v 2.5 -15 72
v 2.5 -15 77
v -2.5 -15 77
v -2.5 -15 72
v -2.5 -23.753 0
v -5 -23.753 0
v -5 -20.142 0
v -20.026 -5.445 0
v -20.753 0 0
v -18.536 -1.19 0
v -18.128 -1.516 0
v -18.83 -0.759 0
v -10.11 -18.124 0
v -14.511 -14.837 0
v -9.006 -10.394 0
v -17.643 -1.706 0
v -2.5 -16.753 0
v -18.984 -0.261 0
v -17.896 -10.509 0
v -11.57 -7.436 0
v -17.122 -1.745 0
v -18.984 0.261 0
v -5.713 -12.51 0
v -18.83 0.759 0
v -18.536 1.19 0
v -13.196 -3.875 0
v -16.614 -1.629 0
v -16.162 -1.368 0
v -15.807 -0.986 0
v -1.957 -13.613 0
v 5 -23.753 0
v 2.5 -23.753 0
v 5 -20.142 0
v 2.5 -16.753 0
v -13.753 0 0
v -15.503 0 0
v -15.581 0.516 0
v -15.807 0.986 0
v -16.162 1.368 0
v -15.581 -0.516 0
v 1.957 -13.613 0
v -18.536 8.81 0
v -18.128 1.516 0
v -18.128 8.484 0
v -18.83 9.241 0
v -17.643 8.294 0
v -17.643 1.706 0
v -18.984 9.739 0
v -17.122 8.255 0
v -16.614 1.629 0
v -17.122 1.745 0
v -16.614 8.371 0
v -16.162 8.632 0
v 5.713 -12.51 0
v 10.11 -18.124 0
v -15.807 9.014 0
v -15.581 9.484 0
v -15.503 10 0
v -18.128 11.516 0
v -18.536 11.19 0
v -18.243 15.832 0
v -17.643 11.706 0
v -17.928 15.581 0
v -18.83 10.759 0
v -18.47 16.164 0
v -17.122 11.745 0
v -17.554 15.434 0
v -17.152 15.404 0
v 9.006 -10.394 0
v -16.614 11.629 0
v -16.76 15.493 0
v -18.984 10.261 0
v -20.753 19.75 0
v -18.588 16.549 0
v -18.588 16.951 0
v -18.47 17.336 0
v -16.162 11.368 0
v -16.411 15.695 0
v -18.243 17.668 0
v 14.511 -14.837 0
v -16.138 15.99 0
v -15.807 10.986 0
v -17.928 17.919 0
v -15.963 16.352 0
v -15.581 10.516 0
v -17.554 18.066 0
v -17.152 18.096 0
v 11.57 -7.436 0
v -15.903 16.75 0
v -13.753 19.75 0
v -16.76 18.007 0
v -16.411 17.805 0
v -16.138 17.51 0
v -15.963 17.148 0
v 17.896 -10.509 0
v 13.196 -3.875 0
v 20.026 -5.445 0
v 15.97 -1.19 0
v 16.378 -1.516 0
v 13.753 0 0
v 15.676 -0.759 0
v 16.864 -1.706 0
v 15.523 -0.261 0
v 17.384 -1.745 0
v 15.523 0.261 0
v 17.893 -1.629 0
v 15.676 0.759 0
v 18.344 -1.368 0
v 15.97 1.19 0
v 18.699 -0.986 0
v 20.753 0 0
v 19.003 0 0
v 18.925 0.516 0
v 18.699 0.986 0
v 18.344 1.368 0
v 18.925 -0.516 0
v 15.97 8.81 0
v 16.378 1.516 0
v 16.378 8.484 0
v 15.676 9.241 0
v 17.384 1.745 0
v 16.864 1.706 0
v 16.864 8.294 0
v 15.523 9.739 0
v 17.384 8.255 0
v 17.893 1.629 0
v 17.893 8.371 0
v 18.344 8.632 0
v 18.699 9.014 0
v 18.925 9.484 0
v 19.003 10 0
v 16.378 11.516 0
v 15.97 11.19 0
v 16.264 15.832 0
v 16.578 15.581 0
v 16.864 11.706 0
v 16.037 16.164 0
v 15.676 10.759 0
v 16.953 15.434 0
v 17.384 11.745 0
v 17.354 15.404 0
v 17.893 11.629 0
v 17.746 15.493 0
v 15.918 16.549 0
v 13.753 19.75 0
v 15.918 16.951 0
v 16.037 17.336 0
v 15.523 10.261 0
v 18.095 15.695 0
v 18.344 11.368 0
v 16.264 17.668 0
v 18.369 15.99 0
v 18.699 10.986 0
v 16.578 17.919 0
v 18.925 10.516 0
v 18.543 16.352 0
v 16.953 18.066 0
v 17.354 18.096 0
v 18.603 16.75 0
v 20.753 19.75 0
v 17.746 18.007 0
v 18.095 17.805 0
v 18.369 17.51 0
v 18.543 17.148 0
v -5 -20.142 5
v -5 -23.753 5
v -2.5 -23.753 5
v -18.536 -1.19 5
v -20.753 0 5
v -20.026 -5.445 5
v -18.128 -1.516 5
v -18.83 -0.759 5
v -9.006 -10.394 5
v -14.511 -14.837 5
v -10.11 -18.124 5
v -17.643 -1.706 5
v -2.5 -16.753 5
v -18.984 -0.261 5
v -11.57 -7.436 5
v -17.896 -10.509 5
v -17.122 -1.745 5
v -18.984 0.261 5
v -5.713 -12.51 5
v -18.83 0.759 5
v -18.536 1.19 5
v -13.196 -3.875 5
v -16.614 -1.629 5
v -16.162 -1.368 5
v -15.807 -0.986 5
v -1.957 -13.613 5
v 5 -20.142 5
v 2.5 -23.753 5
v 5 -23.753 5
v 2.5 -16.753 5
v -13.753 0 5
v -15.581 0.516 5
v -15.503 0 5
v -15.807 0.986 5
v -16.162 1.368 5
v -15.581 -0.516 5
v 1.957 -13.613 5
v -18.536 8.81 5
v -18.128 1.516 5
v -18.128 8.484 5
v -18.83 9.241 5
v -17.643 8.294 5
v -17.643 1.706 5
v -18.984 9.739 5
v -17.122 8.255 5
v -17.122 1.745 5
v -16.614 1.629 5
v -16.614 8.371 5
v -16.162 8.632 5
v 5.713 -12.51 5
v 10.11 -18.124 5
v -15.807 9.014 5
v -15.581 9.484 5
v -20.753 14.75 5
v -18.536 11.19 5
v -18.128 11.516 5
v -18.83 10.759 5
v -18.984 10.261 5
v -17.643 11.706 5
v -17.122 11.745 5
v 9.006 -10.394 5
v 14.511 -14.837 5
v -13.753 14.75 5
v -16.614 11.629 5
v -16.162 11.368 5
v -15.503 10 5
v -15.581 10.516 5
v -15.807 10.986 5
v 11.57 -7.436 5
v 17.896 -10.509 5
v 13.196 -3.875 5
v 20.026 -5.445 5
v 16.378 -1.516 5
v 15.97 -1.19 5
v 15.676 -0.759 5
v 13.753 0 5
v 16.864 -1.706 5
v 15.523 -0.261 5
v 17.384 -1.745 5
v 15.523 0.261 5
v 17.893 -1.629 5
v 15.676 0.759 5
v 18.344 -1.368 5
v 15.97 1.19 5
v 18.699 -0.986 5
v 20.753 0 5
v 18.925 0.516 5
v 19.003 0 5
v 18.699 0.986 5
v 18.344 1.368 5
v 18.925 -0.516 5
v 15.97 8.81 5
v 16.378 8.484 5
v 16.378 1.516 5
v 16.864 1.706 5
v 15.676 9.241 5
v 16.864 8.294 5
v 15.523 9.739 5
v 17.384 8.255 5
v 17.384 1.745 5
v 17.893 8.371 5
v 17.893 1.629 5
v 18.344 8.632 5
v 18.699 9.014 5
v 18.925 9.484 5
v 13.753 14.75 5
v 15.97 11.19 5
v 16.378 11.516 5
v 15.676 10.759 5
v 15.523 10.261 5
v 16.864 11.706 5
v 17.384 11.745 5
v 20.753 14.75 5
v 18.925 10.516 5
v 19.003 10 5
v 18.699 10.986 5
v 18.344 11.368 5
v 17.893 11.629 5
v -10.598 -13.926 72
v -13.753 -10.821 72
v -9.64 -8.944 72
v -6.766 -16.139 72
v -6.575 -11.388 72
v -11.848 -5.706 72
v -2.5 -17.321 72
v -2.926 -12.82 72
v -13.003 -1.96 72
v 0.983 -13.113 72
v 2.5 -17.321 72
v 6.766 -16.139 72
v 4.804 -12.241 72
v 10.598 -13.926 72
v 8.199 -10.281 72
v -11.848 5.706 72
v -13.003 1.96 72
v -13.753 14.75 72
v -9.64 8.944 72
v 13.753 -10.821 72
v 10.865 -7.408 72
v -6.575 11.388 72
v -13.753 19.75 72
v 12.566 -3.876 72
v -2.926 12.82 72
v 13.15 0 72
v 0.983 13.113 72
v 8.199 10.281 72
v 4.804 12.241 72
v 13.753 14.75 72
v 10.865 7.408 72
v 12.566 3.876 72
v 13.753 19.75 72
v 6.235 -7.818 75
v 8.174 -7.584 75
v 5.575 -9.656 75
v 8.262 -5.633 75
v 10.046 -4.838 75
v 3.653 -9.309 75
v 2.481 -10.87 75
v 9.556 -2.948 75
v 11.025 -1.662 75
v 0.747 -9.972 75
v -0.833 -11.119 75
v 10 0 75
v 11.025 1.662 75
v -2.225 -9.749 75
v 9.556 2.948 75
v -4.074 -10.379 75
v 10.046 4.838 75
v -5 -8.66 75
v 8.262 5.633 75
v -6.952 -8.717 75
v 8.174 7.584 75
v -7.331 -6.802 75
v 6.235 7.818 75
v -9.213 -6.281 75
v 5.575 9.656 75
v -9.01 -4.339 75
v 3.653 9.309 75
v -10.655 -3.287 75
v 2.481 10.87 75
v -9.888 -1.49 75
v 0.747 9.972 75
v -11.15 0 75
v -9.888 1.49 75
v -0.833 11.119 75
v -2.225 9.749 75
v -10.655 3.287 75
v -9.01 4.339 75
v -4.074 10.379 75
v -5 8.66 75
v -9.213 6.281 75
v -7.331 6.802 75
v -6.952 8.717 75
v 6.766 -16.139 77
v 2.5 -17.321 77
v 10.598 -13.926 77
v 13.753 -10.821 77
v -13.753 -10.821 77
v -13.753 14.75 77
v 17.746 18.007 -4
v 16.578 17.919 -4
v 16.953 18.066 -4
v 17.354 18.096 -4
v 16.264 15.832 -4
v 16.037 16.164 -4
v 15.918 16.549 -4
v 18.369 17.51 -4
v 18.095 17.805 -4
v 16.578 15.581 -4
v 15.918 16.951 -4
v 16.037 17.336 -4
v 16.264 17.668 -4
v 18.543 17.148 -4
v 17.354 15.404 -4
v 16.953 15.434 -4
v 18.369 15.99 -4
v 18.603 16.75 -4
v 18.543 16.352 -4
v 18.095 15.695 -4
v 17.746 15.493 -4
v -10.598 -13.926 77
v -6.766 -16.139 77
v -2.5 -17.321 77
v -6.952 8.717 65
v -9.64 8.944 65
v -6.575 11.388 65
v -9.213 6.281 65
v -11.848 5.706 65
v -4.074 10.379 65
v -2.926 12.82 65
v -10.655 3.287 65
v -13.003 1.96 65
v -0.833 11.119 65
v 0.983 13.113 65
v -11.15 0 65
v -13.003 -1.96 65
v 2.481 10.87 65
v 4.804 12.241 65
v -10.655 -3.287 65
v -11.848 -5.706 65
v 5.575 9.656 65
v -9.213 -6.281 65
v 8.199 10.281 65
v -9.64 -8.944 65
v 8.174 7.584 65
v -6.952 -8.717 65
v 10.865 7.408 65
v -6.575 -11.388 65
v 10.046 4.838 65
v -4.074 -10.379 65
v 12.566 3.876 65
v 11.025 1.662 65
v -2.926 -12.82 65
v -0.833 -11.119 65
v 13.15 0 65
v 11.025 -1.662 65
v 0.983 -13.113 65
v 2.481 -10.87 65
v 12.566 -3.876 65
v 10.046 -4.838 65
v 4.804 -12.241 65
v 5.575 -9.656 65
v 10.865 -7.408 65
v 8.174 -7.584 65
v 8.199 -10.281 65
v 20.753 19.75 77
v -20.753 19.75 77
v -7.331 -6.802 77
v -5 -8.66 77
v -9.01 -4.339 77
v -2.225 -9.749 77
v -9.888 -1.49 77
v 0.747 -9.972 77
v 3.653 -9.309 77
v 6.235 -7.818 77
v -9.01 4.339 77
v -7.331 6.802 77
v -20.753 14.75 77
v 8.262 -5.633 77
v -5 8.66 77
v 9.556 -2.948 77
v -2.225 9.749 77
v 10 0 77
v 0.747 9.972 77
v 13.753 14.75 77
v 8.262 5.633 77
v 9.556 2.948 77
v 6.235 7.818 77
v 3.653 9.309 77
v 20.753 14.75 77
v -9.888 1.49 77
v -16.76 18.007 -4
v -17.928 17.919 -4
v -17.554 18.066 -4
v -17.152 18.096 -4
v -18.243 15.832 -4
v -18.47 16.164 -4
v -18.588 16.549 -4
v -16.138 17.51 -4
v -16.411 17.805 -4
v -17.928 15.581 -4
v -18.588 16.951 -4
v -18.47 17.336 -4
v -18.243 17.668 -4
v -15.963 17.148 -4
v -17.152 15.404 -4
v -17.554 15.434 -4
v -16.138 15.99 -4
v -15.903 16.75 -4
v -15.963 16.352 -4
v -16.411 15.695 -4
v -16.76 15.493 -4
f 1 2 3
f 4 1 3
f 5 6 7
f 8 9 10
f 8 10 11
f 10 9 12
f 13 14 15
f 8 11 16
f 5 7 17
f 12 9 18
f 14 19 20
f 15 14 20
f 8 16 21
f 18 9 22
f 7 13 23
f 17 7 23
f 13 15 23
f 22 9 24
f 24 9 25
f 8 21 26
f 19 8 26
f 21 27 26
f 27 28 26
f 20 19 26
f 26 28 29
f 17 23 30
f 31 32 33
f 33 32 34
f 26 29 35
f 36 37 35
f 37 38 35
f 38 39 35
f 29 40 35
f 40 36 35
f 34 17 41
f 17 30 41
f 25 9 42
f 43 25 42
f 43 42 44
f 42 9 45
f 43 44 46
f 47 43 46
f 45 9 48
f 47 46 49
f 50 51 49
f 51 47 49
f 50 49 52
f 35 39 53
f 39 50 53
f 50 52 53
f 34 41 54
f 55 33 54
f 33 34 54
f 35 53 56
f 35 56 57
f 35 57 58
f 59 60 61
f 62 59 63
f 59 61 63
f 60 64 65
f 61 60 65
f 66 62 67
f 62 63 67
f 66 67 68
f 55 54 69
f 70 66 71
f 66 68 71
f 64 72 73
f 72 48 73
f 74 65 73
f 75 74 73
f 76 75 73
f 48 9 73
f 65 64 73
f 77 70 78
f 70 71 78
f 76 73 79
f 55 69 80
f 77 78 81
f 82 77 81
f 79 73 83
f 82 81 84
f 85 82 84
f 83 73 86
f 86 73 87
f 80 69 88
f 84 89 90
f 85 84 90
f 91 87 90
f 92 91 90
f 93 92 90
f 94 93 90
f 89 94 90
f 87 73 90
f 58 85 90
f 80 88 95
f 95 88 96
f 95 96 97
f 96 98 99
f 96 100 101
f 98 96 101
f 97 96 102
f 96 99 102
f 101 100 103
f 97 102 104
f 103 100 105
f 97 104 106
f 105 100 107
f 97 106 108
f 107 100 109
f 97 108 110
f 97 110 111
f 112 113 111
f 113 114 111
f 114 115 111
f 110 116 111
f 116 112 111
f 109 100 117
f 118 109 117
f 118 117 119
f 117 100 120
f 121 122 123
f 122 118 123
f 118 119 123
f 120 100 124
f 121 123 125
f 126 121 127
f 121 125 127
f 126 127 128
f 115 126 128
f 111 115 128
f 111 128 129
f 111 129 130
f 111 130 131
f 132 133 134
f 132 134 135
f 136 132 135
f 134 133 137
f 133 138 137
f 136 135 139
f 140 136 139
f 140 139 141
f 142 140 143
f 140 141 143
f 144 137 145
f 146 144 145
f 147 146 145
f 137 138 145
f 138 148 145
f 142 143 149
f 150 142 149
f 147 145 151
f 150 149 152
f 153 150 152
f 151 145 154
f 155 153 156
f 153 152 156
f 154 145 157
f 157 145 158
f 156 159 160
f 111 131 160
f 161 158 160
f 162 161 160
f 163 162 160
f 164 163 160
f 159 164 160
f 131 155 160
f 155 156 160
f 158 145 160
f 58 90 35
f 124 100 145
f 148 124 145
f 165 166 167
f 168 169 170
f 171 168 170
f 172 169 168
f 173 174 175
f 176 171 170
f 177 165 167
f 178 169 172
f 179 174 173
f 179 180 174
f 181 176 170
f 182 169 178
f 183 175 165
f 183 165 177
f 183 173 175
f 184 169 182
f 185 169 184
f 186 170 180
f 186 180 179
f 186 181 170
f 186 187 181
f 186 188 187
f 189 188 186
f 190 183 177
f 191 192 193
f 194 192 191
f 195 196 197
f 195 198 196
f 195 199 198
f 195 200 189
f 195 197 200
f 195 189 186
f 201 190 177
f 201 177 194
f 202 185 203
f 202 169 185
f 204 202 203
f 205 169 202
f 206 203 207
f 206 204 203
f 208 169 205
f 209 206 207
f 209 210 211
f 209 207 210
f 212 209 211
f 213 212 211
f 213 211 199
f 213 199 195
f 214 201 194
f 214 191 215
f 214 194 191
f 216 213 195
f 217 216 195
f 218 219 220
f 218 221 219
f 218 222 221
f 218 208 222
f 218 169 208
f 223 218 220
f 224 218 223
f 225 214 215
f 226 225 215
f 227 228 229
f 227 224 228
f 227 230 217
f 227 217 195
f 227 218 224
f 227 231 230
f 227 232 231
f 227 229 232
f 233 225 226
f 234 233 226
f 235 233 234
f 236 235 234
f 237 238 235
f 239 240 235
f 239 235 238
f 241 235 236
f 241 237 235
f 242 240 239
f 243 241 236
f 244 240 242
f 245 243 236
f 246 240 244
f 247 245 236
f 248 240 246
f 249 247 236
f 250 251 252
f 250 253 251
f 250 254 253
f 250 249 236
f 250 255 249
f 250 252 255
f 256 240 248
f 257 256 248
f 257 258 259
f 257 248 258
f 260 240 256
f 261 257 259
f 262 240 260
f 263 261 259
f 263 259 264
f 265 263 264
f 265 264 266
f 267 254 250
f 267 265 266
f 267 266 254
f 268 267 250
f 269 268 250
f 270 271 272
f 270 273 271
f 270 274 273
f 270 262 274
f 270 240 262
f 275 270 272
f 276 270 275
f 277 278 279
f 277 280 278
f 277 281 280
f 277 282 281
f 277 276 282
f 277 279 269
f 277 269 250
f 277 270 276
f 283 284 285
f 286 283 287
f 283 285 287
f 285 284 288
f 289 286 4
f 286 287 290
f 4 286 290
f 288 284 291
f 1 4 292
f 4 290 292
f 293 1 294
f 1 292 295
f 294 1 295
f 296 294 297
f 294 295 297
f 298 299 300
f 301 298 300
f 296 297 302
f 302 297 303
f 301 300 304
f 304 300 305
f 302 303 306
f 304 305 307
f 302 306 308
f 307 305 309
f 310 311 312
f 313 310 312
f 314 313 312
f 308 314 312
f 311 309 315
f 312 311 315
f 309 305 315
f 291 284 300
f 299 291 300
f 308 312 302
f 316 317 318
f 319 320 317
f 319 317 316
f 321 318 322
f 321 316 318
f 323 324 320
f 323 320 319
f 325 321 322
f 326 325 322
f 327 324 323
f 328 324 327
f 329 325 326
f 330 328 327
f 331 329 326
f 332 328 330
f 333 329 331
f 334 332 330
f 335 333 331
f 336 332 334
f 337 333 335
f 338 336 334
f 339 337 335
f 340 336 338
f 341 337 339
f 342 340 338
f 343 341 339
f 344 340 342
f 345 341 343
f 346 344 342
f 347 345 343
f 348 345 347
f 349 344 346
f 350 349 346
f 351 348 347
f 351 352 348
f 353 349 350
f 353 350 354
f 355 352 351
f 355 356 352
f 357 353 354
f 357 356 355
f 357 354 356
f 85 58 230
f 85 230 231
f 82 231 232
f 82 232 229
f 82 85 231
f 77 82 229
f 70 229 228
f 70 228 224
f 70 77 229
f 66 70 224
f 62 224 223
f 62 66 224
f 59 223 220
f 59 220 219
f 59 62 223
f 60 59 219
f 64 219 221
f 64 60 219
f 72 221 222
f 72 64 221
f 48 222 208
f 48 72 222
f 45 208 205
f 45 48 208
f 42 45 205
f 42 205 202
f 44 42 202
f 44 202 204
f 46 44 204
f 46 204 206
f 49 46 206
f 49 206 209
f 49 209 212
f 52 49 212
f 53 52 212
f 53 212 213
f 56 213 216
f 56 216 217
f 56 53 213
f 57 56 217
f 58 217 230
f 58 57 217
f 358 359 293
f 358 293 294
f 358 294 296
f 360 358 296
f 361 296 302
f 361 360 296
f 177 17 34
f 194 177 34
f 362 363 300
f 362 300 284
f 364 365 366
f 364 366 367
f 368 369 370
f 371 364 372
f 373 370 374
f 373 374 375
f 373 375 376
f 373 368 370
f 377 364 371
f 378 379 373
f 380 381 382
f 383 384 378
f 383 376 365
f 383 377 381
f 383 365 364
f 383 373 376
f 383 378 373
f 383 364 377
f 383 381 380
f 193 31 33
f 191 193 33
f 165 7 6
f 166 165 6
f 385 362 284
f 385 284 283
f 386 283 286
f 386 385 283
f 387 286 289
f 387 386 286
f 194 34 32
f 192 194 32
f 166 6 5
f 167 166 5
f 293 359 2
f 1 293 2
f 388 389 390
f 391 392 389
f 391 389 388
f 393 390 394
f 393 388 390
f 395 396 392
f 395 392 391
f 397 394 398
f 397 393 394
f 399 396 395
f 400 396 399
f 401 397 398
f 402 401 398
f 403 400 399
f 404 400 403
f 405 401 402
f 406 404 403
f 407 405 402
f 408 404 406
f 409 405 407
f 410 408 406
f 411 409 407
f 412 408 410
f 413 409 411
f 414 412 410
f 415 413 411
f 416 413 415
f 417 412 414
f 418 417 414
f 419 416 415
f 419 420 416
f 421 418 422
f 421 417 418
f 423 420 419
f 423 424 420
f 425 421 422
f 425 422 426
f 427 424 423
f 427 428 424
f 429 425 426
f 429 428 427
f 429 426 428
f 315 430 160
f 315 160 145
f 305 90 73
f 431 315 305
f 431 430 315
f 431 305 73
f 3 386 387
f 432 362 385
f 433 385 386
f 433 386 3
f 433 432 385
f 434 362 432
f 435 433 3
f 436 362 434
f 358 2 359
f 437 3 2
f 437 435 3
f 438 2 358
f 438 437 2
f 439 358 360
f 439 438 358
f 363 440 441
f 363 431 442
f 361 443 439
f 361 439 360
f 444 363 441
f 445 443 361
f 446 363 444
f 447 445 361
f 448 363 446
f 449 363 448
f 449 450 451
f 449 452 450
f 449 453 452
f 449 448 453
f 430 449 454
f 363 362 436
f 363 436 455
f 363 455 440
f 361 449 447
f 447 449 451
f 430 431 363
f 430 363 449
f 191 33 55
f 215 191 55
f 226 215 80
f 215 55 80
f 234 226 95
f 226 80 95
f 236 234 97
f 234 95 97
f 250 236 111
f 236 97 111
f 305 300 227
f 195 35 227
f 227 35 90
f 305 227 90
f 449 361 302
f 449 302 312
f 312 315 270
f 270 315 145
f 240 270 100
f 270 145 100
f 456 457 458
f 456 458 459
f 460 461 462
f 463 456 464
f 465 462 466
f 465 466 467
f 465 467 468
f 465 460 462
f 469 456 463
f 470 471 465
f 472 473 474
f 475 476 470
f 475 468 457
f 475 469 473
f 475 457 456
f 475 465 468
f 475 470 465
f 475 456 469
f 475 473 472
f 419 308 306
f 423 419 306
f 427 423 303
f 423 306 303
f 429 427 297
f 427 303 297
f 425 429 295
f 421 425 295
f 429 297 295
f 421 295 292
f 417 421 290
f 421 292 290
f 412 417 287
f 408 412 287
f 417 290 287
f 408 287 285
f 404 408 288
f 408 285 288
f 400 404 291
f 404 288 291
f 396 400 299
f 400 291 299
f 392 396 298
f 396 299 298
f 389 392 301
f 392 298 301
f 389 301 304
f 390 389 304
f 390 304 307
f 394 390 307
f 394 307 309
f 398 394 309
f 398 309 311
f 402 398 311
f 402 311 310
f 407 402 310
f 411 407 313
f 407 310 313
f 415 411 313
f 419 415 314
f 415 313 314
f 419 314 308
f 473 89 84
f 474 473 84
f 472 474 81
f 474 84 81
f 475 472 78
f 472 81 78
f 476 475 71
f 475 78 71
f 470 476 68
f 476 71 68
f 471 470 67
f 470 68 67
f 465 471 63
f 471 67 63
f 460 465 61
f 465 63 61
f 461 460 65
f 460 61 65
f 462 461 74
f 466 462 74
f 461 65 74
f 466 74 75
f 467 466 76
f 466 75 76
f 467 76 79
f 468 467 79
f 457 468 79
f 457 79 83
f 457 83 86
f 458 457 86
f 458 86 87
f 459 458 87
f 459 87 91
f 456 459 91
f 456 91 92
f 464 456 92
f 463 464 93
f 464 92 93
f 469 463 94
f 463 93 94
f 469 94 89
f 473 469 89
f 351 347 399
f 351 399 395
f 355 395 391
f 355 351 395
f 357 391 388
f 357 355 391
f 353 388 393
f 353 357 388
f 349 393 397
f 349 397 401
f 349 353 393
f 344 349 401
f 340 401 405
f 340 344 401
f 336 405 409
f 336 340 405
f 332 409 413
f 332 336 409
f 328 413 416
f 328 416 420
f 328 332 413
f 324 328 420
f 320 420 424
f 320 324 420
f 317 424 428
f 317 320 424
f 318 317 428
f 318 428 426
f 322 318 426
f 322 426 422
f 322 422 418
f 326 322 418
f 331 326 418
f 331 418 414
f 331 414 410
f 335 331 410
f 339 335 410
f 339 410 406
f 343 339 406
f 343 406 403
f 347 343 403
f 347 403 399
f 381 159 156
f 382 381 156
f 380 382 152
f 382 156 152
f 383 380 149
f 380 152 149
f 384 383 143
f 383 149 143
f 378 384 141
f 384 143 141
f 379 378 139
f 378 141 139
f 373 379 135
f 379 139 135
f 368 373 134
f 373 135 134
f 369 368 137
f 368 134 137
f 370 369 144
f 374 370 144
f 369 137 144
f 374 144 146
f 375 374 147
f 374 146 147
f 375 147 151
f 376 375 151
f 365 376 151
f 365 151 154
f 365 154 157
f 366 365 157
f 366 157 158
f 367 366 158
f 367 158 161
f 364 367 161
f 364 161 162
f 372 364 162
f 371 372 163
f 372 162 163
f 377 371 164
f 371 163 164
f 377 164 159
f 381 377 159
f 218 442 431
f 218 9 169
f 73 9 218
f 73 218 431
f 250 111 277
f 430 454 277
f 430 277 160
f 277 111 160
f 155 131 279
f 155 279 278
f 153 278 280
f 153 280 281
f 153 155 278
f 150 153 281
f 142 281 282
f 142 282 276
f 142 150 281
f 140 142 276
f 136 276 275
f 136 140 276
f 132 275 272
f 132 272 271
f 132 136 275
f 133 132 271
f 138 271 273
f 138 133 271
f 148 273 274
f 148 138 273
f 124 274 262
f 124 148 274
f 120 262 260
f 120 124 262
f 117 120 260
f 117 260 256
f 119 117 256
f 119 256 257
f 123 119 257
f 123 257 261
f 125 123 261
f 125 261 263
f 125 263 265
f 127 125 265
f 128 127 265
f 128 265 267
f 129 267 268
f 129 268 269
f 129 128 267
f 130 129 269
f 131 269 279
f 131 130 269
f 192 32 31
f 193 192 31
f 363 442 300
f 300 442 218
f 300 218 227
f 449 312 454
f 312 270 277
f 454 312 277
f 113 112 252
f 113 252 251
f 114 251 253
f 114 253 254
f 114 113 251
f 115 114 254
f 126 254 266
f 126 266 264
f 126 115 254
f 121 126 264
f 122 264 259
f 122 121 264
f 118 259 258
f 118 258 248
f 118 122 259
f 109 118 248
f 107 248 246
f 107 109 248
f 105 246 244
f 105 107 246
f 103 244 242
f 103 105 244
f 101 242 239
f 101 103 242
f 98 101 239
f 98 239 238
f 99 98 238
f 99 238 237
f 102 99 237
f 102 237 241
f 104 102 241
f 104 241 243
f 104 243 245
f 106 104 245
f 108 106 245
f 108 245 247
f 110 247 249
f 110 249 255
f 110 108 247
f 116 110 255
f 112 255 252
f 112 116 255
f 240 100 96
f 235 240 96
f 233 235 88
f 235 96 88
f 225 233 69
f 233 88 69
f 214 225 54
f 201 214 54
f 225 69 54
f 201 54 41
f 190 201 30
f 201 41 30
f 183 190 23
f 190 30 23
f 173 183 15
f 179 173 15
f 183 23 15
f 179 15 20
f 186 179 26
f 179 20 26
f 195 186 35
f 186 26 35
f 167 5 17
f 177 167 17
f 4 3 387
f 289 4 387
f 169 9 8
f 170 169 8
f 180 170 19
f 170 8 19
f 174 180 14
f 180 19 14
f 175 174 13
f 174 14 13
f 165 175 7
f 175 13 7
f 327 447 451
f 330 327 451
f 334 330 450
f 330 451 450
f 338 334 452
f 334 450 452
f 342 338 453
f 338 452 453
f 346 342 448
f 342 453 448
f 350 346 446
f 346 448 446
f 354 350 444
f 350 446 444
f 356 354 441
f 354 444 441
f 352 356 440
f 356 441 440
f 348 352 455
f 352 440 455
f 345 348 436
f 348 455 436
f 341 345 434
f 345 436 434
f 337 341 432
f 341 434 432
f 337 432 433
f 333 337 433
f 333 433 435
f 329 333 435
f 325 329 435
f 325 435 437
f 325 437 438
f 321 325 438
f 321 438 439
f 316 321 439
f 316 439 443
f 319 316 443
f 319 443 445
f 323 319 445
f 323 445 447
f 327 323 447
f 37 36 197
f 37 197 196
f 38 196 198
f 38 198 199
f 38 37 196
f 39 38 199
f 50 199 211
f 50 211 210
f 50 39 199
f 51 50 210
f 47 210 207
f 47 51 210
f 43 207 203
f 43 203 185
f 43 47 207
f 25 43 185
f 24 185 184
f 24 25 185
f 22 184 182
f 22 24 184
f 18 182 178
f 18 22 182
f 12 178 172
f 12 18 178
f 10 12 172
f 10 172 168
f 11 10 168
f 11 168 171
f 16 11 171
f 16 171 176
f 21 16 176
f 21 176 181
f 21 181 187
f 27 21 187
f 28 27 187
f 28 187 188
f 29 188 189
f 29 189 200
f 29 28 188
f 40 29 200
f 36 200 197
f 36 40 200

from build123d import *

# Parameters (mm, degrees)
SKETCH1_R           = 1.75
BOSS_EXTRUDE1_DEPTH = 5
SKETCH2_R           = 1.35
BOSS_EXTRUDE2_DEPTH = 4
SKETCH4_W           = 7
SKETCH4_H           = 5
BOSS_EXTRUDE3_DEPTH = 72
SKETCH5_R           = 10
BOSS_EXTRUDE4_DEPTH = 5
SKETCH6_R           = 13.15
SKETCH6_R_2         = 11.15
BOSS_EXTRUDE5_DEPTH = 7
CUT_EXTRUDE1_START  = -3
SKETCH7_R           = 11.15
CUT_EXTRUDE1_DEPTH  = 3
CUT_EXTRUDE2_DEPTH  = 5


with BuildPart() as part:
    # Sketch1 → Boss-Extrude1 (new body)
    with BuildSketch(Plane.XY):
        with BuildLine():
            Line((-13.753194099, 0), (-13.753194099, 19.75))
            Line((-13.753194099, 19.75), (-20.753194099, 19.75))
            Line((-20.753194099, 19.75), (-20.753194099, 0))
            ThreePointArc((-20.753194099, 0), (-16.34718685, -12.785325472), (-5, -20.141873431))
            Line((-5, -20.141873431), (-5, -23.753194099))
            Line((-5, -23.753194099), (-2.5, -23.753194099))
            Line((-2.5, -23.753194099), (-2.5, -16.753194099))
            Line((-2.5, -16.753194099), (2.5, -16.753194099))
            Line((2.5, -16.753194099), (2.5, -23.753194099))
            Line((2.5, -23.753194099), (5, -23.753194099))
            Line((5, -23.753194099), (5, -20.141873431))
            ThreePointArc((5, -20.141873431), (16.34718685, -12.785325472), (20.753194099, 0))
            Line((20.753194099, 0), (20.753194099, 19.75))
            Line((20.753194099, 19.75), (13.753194099, 19.75))
            Line((13.753194099, 19.75), (13.753194099, 0))
            ThreePointArc((13.753194099, 0), (0, -13.753194099), (-13.753194099, 0))
        make_face()
        with Locations((-17.253194099, 0)):
            Circle(SKETCH1_R, mode=Mode.SUBTRACT)
        with Locations((-17.253194099, 10)):
            Circle(SKETCH1_R, mode=Mode.SUBTRACT)
        with Locations((17.253194099, 10)):
            Circle(SKETCH1_R, mode=Mode.SUBTRACT)
        with Locations((17.253194099, 0)):
            Circle(SKETCH1_R, mode=Mode.SUBTRACT)
    extrude(amount=BOSS_EXTRUDE1_DEPTH)

    # Sketch2 → Boss-Extrude2 (add)
    with BuildSketch(Plane(origin=(0, 0, 0), x_dir=(-1, 0, 0), z_dir=(0, 0, -1))):
        with Locations(Location((-17.253194099, 16.75, 0), (0, 0, 180))):
            Circle(SKETCH2_R)
        with Locations(Location((17.253194099, 16.75, 0), (0, 0, 180))):
            Circle(SKETCH2_R)
    extrude(amount=BOSS_EXTRUDE2_DEPTH)

    # Sketch4 → Boss-Extrude3 (add)
    with BuildSketch(Plane.XY.offset(5)):
        with Locations((-17.253194099, 17.25)):
            Rectangle(SKETCH4_W, SKETCH4_H)
        with Locations((17.253194099, 17.25)):
            Rectangle(SKETCH4_W, SKETCH4_H)
    extrude(amount=BOSS_EXTRUDE3_DEPTH)

    # Sketch5 → Boss-Extrude4 (add)
    with BuildSketch(Plane.XY.offset(77)):
        with BuildLine():
            Line((-13.753194099, 19.75), (-13.753194099, 14.75))
            Line((-13.753194099, 14.75), (-13.753194099, -10.821259264))
            ThreePointArc((-13.753194099, -10.821259264), (0, -17.5), (13.753194099, -10.821259264))
            Line((13.753194099, -10.821259264), (13.753194099, 14.75))
            Line((13.753194099, 14.75), (13.753194099, 19.75))
            Line((13.753194099, 19.75), (-13.753194099, 19.75))
        make_face()
        Circle(SKETCH5_R, mode=Mode.SUBTRACT)
    extrude(amount=-BOSS_EXTRUDE4_DEPTH)

    # Sketch6 → Boss-Extrude5 (add)
    with BuildSketch(Plane(origin=(0, 0, 72), x_dir=(-1, 0, 0), z_dir=(0, 0, -1))):
        with Locations(Location((0, 0, 0), (0, 0, 180))):
            Circle(SKETCH6_R)
        Circle(SKETCH6_R_2, mode=Mode.SUBTRACT)
    extrude(amount=BOSS_EXTRUDE5_DEPTH)

    # Sketch7 → Cut-Extrude1 (cut)
    with BuildSketch(Plane(origin=(0, 0, 72), x_dir=(-1, 0, 0), z_dir=(0, 0, -1)).offset(CUT_EXTRUDE1_START)):
        Circle(SKETCH7_R)
    extrude(amount=CUT_EXTRUDE1_DEPTH, mode=Mode.SUBTRACT)

    # Sketch8 → Cut-Extrude2 (cut)
    with BuildSketch(Plane.XY.offset(77)):
        with BuildLine():
            Line((2.5, -17.320508076), (2.5, -15))
            Line((2.5, -15), (-2.5, -15))
            Line((-2.5, -15), (-2.5, -17.320508076))
            ThreePointArc((-2.5, -17.320508076), (0, -17.5), (2.5, -17.320508076))
        make_face()
    extrude(amount=-CUT_EXTRUDE2_DEPTH, mode=Mode.SUBTRACT)


solid = part.part
